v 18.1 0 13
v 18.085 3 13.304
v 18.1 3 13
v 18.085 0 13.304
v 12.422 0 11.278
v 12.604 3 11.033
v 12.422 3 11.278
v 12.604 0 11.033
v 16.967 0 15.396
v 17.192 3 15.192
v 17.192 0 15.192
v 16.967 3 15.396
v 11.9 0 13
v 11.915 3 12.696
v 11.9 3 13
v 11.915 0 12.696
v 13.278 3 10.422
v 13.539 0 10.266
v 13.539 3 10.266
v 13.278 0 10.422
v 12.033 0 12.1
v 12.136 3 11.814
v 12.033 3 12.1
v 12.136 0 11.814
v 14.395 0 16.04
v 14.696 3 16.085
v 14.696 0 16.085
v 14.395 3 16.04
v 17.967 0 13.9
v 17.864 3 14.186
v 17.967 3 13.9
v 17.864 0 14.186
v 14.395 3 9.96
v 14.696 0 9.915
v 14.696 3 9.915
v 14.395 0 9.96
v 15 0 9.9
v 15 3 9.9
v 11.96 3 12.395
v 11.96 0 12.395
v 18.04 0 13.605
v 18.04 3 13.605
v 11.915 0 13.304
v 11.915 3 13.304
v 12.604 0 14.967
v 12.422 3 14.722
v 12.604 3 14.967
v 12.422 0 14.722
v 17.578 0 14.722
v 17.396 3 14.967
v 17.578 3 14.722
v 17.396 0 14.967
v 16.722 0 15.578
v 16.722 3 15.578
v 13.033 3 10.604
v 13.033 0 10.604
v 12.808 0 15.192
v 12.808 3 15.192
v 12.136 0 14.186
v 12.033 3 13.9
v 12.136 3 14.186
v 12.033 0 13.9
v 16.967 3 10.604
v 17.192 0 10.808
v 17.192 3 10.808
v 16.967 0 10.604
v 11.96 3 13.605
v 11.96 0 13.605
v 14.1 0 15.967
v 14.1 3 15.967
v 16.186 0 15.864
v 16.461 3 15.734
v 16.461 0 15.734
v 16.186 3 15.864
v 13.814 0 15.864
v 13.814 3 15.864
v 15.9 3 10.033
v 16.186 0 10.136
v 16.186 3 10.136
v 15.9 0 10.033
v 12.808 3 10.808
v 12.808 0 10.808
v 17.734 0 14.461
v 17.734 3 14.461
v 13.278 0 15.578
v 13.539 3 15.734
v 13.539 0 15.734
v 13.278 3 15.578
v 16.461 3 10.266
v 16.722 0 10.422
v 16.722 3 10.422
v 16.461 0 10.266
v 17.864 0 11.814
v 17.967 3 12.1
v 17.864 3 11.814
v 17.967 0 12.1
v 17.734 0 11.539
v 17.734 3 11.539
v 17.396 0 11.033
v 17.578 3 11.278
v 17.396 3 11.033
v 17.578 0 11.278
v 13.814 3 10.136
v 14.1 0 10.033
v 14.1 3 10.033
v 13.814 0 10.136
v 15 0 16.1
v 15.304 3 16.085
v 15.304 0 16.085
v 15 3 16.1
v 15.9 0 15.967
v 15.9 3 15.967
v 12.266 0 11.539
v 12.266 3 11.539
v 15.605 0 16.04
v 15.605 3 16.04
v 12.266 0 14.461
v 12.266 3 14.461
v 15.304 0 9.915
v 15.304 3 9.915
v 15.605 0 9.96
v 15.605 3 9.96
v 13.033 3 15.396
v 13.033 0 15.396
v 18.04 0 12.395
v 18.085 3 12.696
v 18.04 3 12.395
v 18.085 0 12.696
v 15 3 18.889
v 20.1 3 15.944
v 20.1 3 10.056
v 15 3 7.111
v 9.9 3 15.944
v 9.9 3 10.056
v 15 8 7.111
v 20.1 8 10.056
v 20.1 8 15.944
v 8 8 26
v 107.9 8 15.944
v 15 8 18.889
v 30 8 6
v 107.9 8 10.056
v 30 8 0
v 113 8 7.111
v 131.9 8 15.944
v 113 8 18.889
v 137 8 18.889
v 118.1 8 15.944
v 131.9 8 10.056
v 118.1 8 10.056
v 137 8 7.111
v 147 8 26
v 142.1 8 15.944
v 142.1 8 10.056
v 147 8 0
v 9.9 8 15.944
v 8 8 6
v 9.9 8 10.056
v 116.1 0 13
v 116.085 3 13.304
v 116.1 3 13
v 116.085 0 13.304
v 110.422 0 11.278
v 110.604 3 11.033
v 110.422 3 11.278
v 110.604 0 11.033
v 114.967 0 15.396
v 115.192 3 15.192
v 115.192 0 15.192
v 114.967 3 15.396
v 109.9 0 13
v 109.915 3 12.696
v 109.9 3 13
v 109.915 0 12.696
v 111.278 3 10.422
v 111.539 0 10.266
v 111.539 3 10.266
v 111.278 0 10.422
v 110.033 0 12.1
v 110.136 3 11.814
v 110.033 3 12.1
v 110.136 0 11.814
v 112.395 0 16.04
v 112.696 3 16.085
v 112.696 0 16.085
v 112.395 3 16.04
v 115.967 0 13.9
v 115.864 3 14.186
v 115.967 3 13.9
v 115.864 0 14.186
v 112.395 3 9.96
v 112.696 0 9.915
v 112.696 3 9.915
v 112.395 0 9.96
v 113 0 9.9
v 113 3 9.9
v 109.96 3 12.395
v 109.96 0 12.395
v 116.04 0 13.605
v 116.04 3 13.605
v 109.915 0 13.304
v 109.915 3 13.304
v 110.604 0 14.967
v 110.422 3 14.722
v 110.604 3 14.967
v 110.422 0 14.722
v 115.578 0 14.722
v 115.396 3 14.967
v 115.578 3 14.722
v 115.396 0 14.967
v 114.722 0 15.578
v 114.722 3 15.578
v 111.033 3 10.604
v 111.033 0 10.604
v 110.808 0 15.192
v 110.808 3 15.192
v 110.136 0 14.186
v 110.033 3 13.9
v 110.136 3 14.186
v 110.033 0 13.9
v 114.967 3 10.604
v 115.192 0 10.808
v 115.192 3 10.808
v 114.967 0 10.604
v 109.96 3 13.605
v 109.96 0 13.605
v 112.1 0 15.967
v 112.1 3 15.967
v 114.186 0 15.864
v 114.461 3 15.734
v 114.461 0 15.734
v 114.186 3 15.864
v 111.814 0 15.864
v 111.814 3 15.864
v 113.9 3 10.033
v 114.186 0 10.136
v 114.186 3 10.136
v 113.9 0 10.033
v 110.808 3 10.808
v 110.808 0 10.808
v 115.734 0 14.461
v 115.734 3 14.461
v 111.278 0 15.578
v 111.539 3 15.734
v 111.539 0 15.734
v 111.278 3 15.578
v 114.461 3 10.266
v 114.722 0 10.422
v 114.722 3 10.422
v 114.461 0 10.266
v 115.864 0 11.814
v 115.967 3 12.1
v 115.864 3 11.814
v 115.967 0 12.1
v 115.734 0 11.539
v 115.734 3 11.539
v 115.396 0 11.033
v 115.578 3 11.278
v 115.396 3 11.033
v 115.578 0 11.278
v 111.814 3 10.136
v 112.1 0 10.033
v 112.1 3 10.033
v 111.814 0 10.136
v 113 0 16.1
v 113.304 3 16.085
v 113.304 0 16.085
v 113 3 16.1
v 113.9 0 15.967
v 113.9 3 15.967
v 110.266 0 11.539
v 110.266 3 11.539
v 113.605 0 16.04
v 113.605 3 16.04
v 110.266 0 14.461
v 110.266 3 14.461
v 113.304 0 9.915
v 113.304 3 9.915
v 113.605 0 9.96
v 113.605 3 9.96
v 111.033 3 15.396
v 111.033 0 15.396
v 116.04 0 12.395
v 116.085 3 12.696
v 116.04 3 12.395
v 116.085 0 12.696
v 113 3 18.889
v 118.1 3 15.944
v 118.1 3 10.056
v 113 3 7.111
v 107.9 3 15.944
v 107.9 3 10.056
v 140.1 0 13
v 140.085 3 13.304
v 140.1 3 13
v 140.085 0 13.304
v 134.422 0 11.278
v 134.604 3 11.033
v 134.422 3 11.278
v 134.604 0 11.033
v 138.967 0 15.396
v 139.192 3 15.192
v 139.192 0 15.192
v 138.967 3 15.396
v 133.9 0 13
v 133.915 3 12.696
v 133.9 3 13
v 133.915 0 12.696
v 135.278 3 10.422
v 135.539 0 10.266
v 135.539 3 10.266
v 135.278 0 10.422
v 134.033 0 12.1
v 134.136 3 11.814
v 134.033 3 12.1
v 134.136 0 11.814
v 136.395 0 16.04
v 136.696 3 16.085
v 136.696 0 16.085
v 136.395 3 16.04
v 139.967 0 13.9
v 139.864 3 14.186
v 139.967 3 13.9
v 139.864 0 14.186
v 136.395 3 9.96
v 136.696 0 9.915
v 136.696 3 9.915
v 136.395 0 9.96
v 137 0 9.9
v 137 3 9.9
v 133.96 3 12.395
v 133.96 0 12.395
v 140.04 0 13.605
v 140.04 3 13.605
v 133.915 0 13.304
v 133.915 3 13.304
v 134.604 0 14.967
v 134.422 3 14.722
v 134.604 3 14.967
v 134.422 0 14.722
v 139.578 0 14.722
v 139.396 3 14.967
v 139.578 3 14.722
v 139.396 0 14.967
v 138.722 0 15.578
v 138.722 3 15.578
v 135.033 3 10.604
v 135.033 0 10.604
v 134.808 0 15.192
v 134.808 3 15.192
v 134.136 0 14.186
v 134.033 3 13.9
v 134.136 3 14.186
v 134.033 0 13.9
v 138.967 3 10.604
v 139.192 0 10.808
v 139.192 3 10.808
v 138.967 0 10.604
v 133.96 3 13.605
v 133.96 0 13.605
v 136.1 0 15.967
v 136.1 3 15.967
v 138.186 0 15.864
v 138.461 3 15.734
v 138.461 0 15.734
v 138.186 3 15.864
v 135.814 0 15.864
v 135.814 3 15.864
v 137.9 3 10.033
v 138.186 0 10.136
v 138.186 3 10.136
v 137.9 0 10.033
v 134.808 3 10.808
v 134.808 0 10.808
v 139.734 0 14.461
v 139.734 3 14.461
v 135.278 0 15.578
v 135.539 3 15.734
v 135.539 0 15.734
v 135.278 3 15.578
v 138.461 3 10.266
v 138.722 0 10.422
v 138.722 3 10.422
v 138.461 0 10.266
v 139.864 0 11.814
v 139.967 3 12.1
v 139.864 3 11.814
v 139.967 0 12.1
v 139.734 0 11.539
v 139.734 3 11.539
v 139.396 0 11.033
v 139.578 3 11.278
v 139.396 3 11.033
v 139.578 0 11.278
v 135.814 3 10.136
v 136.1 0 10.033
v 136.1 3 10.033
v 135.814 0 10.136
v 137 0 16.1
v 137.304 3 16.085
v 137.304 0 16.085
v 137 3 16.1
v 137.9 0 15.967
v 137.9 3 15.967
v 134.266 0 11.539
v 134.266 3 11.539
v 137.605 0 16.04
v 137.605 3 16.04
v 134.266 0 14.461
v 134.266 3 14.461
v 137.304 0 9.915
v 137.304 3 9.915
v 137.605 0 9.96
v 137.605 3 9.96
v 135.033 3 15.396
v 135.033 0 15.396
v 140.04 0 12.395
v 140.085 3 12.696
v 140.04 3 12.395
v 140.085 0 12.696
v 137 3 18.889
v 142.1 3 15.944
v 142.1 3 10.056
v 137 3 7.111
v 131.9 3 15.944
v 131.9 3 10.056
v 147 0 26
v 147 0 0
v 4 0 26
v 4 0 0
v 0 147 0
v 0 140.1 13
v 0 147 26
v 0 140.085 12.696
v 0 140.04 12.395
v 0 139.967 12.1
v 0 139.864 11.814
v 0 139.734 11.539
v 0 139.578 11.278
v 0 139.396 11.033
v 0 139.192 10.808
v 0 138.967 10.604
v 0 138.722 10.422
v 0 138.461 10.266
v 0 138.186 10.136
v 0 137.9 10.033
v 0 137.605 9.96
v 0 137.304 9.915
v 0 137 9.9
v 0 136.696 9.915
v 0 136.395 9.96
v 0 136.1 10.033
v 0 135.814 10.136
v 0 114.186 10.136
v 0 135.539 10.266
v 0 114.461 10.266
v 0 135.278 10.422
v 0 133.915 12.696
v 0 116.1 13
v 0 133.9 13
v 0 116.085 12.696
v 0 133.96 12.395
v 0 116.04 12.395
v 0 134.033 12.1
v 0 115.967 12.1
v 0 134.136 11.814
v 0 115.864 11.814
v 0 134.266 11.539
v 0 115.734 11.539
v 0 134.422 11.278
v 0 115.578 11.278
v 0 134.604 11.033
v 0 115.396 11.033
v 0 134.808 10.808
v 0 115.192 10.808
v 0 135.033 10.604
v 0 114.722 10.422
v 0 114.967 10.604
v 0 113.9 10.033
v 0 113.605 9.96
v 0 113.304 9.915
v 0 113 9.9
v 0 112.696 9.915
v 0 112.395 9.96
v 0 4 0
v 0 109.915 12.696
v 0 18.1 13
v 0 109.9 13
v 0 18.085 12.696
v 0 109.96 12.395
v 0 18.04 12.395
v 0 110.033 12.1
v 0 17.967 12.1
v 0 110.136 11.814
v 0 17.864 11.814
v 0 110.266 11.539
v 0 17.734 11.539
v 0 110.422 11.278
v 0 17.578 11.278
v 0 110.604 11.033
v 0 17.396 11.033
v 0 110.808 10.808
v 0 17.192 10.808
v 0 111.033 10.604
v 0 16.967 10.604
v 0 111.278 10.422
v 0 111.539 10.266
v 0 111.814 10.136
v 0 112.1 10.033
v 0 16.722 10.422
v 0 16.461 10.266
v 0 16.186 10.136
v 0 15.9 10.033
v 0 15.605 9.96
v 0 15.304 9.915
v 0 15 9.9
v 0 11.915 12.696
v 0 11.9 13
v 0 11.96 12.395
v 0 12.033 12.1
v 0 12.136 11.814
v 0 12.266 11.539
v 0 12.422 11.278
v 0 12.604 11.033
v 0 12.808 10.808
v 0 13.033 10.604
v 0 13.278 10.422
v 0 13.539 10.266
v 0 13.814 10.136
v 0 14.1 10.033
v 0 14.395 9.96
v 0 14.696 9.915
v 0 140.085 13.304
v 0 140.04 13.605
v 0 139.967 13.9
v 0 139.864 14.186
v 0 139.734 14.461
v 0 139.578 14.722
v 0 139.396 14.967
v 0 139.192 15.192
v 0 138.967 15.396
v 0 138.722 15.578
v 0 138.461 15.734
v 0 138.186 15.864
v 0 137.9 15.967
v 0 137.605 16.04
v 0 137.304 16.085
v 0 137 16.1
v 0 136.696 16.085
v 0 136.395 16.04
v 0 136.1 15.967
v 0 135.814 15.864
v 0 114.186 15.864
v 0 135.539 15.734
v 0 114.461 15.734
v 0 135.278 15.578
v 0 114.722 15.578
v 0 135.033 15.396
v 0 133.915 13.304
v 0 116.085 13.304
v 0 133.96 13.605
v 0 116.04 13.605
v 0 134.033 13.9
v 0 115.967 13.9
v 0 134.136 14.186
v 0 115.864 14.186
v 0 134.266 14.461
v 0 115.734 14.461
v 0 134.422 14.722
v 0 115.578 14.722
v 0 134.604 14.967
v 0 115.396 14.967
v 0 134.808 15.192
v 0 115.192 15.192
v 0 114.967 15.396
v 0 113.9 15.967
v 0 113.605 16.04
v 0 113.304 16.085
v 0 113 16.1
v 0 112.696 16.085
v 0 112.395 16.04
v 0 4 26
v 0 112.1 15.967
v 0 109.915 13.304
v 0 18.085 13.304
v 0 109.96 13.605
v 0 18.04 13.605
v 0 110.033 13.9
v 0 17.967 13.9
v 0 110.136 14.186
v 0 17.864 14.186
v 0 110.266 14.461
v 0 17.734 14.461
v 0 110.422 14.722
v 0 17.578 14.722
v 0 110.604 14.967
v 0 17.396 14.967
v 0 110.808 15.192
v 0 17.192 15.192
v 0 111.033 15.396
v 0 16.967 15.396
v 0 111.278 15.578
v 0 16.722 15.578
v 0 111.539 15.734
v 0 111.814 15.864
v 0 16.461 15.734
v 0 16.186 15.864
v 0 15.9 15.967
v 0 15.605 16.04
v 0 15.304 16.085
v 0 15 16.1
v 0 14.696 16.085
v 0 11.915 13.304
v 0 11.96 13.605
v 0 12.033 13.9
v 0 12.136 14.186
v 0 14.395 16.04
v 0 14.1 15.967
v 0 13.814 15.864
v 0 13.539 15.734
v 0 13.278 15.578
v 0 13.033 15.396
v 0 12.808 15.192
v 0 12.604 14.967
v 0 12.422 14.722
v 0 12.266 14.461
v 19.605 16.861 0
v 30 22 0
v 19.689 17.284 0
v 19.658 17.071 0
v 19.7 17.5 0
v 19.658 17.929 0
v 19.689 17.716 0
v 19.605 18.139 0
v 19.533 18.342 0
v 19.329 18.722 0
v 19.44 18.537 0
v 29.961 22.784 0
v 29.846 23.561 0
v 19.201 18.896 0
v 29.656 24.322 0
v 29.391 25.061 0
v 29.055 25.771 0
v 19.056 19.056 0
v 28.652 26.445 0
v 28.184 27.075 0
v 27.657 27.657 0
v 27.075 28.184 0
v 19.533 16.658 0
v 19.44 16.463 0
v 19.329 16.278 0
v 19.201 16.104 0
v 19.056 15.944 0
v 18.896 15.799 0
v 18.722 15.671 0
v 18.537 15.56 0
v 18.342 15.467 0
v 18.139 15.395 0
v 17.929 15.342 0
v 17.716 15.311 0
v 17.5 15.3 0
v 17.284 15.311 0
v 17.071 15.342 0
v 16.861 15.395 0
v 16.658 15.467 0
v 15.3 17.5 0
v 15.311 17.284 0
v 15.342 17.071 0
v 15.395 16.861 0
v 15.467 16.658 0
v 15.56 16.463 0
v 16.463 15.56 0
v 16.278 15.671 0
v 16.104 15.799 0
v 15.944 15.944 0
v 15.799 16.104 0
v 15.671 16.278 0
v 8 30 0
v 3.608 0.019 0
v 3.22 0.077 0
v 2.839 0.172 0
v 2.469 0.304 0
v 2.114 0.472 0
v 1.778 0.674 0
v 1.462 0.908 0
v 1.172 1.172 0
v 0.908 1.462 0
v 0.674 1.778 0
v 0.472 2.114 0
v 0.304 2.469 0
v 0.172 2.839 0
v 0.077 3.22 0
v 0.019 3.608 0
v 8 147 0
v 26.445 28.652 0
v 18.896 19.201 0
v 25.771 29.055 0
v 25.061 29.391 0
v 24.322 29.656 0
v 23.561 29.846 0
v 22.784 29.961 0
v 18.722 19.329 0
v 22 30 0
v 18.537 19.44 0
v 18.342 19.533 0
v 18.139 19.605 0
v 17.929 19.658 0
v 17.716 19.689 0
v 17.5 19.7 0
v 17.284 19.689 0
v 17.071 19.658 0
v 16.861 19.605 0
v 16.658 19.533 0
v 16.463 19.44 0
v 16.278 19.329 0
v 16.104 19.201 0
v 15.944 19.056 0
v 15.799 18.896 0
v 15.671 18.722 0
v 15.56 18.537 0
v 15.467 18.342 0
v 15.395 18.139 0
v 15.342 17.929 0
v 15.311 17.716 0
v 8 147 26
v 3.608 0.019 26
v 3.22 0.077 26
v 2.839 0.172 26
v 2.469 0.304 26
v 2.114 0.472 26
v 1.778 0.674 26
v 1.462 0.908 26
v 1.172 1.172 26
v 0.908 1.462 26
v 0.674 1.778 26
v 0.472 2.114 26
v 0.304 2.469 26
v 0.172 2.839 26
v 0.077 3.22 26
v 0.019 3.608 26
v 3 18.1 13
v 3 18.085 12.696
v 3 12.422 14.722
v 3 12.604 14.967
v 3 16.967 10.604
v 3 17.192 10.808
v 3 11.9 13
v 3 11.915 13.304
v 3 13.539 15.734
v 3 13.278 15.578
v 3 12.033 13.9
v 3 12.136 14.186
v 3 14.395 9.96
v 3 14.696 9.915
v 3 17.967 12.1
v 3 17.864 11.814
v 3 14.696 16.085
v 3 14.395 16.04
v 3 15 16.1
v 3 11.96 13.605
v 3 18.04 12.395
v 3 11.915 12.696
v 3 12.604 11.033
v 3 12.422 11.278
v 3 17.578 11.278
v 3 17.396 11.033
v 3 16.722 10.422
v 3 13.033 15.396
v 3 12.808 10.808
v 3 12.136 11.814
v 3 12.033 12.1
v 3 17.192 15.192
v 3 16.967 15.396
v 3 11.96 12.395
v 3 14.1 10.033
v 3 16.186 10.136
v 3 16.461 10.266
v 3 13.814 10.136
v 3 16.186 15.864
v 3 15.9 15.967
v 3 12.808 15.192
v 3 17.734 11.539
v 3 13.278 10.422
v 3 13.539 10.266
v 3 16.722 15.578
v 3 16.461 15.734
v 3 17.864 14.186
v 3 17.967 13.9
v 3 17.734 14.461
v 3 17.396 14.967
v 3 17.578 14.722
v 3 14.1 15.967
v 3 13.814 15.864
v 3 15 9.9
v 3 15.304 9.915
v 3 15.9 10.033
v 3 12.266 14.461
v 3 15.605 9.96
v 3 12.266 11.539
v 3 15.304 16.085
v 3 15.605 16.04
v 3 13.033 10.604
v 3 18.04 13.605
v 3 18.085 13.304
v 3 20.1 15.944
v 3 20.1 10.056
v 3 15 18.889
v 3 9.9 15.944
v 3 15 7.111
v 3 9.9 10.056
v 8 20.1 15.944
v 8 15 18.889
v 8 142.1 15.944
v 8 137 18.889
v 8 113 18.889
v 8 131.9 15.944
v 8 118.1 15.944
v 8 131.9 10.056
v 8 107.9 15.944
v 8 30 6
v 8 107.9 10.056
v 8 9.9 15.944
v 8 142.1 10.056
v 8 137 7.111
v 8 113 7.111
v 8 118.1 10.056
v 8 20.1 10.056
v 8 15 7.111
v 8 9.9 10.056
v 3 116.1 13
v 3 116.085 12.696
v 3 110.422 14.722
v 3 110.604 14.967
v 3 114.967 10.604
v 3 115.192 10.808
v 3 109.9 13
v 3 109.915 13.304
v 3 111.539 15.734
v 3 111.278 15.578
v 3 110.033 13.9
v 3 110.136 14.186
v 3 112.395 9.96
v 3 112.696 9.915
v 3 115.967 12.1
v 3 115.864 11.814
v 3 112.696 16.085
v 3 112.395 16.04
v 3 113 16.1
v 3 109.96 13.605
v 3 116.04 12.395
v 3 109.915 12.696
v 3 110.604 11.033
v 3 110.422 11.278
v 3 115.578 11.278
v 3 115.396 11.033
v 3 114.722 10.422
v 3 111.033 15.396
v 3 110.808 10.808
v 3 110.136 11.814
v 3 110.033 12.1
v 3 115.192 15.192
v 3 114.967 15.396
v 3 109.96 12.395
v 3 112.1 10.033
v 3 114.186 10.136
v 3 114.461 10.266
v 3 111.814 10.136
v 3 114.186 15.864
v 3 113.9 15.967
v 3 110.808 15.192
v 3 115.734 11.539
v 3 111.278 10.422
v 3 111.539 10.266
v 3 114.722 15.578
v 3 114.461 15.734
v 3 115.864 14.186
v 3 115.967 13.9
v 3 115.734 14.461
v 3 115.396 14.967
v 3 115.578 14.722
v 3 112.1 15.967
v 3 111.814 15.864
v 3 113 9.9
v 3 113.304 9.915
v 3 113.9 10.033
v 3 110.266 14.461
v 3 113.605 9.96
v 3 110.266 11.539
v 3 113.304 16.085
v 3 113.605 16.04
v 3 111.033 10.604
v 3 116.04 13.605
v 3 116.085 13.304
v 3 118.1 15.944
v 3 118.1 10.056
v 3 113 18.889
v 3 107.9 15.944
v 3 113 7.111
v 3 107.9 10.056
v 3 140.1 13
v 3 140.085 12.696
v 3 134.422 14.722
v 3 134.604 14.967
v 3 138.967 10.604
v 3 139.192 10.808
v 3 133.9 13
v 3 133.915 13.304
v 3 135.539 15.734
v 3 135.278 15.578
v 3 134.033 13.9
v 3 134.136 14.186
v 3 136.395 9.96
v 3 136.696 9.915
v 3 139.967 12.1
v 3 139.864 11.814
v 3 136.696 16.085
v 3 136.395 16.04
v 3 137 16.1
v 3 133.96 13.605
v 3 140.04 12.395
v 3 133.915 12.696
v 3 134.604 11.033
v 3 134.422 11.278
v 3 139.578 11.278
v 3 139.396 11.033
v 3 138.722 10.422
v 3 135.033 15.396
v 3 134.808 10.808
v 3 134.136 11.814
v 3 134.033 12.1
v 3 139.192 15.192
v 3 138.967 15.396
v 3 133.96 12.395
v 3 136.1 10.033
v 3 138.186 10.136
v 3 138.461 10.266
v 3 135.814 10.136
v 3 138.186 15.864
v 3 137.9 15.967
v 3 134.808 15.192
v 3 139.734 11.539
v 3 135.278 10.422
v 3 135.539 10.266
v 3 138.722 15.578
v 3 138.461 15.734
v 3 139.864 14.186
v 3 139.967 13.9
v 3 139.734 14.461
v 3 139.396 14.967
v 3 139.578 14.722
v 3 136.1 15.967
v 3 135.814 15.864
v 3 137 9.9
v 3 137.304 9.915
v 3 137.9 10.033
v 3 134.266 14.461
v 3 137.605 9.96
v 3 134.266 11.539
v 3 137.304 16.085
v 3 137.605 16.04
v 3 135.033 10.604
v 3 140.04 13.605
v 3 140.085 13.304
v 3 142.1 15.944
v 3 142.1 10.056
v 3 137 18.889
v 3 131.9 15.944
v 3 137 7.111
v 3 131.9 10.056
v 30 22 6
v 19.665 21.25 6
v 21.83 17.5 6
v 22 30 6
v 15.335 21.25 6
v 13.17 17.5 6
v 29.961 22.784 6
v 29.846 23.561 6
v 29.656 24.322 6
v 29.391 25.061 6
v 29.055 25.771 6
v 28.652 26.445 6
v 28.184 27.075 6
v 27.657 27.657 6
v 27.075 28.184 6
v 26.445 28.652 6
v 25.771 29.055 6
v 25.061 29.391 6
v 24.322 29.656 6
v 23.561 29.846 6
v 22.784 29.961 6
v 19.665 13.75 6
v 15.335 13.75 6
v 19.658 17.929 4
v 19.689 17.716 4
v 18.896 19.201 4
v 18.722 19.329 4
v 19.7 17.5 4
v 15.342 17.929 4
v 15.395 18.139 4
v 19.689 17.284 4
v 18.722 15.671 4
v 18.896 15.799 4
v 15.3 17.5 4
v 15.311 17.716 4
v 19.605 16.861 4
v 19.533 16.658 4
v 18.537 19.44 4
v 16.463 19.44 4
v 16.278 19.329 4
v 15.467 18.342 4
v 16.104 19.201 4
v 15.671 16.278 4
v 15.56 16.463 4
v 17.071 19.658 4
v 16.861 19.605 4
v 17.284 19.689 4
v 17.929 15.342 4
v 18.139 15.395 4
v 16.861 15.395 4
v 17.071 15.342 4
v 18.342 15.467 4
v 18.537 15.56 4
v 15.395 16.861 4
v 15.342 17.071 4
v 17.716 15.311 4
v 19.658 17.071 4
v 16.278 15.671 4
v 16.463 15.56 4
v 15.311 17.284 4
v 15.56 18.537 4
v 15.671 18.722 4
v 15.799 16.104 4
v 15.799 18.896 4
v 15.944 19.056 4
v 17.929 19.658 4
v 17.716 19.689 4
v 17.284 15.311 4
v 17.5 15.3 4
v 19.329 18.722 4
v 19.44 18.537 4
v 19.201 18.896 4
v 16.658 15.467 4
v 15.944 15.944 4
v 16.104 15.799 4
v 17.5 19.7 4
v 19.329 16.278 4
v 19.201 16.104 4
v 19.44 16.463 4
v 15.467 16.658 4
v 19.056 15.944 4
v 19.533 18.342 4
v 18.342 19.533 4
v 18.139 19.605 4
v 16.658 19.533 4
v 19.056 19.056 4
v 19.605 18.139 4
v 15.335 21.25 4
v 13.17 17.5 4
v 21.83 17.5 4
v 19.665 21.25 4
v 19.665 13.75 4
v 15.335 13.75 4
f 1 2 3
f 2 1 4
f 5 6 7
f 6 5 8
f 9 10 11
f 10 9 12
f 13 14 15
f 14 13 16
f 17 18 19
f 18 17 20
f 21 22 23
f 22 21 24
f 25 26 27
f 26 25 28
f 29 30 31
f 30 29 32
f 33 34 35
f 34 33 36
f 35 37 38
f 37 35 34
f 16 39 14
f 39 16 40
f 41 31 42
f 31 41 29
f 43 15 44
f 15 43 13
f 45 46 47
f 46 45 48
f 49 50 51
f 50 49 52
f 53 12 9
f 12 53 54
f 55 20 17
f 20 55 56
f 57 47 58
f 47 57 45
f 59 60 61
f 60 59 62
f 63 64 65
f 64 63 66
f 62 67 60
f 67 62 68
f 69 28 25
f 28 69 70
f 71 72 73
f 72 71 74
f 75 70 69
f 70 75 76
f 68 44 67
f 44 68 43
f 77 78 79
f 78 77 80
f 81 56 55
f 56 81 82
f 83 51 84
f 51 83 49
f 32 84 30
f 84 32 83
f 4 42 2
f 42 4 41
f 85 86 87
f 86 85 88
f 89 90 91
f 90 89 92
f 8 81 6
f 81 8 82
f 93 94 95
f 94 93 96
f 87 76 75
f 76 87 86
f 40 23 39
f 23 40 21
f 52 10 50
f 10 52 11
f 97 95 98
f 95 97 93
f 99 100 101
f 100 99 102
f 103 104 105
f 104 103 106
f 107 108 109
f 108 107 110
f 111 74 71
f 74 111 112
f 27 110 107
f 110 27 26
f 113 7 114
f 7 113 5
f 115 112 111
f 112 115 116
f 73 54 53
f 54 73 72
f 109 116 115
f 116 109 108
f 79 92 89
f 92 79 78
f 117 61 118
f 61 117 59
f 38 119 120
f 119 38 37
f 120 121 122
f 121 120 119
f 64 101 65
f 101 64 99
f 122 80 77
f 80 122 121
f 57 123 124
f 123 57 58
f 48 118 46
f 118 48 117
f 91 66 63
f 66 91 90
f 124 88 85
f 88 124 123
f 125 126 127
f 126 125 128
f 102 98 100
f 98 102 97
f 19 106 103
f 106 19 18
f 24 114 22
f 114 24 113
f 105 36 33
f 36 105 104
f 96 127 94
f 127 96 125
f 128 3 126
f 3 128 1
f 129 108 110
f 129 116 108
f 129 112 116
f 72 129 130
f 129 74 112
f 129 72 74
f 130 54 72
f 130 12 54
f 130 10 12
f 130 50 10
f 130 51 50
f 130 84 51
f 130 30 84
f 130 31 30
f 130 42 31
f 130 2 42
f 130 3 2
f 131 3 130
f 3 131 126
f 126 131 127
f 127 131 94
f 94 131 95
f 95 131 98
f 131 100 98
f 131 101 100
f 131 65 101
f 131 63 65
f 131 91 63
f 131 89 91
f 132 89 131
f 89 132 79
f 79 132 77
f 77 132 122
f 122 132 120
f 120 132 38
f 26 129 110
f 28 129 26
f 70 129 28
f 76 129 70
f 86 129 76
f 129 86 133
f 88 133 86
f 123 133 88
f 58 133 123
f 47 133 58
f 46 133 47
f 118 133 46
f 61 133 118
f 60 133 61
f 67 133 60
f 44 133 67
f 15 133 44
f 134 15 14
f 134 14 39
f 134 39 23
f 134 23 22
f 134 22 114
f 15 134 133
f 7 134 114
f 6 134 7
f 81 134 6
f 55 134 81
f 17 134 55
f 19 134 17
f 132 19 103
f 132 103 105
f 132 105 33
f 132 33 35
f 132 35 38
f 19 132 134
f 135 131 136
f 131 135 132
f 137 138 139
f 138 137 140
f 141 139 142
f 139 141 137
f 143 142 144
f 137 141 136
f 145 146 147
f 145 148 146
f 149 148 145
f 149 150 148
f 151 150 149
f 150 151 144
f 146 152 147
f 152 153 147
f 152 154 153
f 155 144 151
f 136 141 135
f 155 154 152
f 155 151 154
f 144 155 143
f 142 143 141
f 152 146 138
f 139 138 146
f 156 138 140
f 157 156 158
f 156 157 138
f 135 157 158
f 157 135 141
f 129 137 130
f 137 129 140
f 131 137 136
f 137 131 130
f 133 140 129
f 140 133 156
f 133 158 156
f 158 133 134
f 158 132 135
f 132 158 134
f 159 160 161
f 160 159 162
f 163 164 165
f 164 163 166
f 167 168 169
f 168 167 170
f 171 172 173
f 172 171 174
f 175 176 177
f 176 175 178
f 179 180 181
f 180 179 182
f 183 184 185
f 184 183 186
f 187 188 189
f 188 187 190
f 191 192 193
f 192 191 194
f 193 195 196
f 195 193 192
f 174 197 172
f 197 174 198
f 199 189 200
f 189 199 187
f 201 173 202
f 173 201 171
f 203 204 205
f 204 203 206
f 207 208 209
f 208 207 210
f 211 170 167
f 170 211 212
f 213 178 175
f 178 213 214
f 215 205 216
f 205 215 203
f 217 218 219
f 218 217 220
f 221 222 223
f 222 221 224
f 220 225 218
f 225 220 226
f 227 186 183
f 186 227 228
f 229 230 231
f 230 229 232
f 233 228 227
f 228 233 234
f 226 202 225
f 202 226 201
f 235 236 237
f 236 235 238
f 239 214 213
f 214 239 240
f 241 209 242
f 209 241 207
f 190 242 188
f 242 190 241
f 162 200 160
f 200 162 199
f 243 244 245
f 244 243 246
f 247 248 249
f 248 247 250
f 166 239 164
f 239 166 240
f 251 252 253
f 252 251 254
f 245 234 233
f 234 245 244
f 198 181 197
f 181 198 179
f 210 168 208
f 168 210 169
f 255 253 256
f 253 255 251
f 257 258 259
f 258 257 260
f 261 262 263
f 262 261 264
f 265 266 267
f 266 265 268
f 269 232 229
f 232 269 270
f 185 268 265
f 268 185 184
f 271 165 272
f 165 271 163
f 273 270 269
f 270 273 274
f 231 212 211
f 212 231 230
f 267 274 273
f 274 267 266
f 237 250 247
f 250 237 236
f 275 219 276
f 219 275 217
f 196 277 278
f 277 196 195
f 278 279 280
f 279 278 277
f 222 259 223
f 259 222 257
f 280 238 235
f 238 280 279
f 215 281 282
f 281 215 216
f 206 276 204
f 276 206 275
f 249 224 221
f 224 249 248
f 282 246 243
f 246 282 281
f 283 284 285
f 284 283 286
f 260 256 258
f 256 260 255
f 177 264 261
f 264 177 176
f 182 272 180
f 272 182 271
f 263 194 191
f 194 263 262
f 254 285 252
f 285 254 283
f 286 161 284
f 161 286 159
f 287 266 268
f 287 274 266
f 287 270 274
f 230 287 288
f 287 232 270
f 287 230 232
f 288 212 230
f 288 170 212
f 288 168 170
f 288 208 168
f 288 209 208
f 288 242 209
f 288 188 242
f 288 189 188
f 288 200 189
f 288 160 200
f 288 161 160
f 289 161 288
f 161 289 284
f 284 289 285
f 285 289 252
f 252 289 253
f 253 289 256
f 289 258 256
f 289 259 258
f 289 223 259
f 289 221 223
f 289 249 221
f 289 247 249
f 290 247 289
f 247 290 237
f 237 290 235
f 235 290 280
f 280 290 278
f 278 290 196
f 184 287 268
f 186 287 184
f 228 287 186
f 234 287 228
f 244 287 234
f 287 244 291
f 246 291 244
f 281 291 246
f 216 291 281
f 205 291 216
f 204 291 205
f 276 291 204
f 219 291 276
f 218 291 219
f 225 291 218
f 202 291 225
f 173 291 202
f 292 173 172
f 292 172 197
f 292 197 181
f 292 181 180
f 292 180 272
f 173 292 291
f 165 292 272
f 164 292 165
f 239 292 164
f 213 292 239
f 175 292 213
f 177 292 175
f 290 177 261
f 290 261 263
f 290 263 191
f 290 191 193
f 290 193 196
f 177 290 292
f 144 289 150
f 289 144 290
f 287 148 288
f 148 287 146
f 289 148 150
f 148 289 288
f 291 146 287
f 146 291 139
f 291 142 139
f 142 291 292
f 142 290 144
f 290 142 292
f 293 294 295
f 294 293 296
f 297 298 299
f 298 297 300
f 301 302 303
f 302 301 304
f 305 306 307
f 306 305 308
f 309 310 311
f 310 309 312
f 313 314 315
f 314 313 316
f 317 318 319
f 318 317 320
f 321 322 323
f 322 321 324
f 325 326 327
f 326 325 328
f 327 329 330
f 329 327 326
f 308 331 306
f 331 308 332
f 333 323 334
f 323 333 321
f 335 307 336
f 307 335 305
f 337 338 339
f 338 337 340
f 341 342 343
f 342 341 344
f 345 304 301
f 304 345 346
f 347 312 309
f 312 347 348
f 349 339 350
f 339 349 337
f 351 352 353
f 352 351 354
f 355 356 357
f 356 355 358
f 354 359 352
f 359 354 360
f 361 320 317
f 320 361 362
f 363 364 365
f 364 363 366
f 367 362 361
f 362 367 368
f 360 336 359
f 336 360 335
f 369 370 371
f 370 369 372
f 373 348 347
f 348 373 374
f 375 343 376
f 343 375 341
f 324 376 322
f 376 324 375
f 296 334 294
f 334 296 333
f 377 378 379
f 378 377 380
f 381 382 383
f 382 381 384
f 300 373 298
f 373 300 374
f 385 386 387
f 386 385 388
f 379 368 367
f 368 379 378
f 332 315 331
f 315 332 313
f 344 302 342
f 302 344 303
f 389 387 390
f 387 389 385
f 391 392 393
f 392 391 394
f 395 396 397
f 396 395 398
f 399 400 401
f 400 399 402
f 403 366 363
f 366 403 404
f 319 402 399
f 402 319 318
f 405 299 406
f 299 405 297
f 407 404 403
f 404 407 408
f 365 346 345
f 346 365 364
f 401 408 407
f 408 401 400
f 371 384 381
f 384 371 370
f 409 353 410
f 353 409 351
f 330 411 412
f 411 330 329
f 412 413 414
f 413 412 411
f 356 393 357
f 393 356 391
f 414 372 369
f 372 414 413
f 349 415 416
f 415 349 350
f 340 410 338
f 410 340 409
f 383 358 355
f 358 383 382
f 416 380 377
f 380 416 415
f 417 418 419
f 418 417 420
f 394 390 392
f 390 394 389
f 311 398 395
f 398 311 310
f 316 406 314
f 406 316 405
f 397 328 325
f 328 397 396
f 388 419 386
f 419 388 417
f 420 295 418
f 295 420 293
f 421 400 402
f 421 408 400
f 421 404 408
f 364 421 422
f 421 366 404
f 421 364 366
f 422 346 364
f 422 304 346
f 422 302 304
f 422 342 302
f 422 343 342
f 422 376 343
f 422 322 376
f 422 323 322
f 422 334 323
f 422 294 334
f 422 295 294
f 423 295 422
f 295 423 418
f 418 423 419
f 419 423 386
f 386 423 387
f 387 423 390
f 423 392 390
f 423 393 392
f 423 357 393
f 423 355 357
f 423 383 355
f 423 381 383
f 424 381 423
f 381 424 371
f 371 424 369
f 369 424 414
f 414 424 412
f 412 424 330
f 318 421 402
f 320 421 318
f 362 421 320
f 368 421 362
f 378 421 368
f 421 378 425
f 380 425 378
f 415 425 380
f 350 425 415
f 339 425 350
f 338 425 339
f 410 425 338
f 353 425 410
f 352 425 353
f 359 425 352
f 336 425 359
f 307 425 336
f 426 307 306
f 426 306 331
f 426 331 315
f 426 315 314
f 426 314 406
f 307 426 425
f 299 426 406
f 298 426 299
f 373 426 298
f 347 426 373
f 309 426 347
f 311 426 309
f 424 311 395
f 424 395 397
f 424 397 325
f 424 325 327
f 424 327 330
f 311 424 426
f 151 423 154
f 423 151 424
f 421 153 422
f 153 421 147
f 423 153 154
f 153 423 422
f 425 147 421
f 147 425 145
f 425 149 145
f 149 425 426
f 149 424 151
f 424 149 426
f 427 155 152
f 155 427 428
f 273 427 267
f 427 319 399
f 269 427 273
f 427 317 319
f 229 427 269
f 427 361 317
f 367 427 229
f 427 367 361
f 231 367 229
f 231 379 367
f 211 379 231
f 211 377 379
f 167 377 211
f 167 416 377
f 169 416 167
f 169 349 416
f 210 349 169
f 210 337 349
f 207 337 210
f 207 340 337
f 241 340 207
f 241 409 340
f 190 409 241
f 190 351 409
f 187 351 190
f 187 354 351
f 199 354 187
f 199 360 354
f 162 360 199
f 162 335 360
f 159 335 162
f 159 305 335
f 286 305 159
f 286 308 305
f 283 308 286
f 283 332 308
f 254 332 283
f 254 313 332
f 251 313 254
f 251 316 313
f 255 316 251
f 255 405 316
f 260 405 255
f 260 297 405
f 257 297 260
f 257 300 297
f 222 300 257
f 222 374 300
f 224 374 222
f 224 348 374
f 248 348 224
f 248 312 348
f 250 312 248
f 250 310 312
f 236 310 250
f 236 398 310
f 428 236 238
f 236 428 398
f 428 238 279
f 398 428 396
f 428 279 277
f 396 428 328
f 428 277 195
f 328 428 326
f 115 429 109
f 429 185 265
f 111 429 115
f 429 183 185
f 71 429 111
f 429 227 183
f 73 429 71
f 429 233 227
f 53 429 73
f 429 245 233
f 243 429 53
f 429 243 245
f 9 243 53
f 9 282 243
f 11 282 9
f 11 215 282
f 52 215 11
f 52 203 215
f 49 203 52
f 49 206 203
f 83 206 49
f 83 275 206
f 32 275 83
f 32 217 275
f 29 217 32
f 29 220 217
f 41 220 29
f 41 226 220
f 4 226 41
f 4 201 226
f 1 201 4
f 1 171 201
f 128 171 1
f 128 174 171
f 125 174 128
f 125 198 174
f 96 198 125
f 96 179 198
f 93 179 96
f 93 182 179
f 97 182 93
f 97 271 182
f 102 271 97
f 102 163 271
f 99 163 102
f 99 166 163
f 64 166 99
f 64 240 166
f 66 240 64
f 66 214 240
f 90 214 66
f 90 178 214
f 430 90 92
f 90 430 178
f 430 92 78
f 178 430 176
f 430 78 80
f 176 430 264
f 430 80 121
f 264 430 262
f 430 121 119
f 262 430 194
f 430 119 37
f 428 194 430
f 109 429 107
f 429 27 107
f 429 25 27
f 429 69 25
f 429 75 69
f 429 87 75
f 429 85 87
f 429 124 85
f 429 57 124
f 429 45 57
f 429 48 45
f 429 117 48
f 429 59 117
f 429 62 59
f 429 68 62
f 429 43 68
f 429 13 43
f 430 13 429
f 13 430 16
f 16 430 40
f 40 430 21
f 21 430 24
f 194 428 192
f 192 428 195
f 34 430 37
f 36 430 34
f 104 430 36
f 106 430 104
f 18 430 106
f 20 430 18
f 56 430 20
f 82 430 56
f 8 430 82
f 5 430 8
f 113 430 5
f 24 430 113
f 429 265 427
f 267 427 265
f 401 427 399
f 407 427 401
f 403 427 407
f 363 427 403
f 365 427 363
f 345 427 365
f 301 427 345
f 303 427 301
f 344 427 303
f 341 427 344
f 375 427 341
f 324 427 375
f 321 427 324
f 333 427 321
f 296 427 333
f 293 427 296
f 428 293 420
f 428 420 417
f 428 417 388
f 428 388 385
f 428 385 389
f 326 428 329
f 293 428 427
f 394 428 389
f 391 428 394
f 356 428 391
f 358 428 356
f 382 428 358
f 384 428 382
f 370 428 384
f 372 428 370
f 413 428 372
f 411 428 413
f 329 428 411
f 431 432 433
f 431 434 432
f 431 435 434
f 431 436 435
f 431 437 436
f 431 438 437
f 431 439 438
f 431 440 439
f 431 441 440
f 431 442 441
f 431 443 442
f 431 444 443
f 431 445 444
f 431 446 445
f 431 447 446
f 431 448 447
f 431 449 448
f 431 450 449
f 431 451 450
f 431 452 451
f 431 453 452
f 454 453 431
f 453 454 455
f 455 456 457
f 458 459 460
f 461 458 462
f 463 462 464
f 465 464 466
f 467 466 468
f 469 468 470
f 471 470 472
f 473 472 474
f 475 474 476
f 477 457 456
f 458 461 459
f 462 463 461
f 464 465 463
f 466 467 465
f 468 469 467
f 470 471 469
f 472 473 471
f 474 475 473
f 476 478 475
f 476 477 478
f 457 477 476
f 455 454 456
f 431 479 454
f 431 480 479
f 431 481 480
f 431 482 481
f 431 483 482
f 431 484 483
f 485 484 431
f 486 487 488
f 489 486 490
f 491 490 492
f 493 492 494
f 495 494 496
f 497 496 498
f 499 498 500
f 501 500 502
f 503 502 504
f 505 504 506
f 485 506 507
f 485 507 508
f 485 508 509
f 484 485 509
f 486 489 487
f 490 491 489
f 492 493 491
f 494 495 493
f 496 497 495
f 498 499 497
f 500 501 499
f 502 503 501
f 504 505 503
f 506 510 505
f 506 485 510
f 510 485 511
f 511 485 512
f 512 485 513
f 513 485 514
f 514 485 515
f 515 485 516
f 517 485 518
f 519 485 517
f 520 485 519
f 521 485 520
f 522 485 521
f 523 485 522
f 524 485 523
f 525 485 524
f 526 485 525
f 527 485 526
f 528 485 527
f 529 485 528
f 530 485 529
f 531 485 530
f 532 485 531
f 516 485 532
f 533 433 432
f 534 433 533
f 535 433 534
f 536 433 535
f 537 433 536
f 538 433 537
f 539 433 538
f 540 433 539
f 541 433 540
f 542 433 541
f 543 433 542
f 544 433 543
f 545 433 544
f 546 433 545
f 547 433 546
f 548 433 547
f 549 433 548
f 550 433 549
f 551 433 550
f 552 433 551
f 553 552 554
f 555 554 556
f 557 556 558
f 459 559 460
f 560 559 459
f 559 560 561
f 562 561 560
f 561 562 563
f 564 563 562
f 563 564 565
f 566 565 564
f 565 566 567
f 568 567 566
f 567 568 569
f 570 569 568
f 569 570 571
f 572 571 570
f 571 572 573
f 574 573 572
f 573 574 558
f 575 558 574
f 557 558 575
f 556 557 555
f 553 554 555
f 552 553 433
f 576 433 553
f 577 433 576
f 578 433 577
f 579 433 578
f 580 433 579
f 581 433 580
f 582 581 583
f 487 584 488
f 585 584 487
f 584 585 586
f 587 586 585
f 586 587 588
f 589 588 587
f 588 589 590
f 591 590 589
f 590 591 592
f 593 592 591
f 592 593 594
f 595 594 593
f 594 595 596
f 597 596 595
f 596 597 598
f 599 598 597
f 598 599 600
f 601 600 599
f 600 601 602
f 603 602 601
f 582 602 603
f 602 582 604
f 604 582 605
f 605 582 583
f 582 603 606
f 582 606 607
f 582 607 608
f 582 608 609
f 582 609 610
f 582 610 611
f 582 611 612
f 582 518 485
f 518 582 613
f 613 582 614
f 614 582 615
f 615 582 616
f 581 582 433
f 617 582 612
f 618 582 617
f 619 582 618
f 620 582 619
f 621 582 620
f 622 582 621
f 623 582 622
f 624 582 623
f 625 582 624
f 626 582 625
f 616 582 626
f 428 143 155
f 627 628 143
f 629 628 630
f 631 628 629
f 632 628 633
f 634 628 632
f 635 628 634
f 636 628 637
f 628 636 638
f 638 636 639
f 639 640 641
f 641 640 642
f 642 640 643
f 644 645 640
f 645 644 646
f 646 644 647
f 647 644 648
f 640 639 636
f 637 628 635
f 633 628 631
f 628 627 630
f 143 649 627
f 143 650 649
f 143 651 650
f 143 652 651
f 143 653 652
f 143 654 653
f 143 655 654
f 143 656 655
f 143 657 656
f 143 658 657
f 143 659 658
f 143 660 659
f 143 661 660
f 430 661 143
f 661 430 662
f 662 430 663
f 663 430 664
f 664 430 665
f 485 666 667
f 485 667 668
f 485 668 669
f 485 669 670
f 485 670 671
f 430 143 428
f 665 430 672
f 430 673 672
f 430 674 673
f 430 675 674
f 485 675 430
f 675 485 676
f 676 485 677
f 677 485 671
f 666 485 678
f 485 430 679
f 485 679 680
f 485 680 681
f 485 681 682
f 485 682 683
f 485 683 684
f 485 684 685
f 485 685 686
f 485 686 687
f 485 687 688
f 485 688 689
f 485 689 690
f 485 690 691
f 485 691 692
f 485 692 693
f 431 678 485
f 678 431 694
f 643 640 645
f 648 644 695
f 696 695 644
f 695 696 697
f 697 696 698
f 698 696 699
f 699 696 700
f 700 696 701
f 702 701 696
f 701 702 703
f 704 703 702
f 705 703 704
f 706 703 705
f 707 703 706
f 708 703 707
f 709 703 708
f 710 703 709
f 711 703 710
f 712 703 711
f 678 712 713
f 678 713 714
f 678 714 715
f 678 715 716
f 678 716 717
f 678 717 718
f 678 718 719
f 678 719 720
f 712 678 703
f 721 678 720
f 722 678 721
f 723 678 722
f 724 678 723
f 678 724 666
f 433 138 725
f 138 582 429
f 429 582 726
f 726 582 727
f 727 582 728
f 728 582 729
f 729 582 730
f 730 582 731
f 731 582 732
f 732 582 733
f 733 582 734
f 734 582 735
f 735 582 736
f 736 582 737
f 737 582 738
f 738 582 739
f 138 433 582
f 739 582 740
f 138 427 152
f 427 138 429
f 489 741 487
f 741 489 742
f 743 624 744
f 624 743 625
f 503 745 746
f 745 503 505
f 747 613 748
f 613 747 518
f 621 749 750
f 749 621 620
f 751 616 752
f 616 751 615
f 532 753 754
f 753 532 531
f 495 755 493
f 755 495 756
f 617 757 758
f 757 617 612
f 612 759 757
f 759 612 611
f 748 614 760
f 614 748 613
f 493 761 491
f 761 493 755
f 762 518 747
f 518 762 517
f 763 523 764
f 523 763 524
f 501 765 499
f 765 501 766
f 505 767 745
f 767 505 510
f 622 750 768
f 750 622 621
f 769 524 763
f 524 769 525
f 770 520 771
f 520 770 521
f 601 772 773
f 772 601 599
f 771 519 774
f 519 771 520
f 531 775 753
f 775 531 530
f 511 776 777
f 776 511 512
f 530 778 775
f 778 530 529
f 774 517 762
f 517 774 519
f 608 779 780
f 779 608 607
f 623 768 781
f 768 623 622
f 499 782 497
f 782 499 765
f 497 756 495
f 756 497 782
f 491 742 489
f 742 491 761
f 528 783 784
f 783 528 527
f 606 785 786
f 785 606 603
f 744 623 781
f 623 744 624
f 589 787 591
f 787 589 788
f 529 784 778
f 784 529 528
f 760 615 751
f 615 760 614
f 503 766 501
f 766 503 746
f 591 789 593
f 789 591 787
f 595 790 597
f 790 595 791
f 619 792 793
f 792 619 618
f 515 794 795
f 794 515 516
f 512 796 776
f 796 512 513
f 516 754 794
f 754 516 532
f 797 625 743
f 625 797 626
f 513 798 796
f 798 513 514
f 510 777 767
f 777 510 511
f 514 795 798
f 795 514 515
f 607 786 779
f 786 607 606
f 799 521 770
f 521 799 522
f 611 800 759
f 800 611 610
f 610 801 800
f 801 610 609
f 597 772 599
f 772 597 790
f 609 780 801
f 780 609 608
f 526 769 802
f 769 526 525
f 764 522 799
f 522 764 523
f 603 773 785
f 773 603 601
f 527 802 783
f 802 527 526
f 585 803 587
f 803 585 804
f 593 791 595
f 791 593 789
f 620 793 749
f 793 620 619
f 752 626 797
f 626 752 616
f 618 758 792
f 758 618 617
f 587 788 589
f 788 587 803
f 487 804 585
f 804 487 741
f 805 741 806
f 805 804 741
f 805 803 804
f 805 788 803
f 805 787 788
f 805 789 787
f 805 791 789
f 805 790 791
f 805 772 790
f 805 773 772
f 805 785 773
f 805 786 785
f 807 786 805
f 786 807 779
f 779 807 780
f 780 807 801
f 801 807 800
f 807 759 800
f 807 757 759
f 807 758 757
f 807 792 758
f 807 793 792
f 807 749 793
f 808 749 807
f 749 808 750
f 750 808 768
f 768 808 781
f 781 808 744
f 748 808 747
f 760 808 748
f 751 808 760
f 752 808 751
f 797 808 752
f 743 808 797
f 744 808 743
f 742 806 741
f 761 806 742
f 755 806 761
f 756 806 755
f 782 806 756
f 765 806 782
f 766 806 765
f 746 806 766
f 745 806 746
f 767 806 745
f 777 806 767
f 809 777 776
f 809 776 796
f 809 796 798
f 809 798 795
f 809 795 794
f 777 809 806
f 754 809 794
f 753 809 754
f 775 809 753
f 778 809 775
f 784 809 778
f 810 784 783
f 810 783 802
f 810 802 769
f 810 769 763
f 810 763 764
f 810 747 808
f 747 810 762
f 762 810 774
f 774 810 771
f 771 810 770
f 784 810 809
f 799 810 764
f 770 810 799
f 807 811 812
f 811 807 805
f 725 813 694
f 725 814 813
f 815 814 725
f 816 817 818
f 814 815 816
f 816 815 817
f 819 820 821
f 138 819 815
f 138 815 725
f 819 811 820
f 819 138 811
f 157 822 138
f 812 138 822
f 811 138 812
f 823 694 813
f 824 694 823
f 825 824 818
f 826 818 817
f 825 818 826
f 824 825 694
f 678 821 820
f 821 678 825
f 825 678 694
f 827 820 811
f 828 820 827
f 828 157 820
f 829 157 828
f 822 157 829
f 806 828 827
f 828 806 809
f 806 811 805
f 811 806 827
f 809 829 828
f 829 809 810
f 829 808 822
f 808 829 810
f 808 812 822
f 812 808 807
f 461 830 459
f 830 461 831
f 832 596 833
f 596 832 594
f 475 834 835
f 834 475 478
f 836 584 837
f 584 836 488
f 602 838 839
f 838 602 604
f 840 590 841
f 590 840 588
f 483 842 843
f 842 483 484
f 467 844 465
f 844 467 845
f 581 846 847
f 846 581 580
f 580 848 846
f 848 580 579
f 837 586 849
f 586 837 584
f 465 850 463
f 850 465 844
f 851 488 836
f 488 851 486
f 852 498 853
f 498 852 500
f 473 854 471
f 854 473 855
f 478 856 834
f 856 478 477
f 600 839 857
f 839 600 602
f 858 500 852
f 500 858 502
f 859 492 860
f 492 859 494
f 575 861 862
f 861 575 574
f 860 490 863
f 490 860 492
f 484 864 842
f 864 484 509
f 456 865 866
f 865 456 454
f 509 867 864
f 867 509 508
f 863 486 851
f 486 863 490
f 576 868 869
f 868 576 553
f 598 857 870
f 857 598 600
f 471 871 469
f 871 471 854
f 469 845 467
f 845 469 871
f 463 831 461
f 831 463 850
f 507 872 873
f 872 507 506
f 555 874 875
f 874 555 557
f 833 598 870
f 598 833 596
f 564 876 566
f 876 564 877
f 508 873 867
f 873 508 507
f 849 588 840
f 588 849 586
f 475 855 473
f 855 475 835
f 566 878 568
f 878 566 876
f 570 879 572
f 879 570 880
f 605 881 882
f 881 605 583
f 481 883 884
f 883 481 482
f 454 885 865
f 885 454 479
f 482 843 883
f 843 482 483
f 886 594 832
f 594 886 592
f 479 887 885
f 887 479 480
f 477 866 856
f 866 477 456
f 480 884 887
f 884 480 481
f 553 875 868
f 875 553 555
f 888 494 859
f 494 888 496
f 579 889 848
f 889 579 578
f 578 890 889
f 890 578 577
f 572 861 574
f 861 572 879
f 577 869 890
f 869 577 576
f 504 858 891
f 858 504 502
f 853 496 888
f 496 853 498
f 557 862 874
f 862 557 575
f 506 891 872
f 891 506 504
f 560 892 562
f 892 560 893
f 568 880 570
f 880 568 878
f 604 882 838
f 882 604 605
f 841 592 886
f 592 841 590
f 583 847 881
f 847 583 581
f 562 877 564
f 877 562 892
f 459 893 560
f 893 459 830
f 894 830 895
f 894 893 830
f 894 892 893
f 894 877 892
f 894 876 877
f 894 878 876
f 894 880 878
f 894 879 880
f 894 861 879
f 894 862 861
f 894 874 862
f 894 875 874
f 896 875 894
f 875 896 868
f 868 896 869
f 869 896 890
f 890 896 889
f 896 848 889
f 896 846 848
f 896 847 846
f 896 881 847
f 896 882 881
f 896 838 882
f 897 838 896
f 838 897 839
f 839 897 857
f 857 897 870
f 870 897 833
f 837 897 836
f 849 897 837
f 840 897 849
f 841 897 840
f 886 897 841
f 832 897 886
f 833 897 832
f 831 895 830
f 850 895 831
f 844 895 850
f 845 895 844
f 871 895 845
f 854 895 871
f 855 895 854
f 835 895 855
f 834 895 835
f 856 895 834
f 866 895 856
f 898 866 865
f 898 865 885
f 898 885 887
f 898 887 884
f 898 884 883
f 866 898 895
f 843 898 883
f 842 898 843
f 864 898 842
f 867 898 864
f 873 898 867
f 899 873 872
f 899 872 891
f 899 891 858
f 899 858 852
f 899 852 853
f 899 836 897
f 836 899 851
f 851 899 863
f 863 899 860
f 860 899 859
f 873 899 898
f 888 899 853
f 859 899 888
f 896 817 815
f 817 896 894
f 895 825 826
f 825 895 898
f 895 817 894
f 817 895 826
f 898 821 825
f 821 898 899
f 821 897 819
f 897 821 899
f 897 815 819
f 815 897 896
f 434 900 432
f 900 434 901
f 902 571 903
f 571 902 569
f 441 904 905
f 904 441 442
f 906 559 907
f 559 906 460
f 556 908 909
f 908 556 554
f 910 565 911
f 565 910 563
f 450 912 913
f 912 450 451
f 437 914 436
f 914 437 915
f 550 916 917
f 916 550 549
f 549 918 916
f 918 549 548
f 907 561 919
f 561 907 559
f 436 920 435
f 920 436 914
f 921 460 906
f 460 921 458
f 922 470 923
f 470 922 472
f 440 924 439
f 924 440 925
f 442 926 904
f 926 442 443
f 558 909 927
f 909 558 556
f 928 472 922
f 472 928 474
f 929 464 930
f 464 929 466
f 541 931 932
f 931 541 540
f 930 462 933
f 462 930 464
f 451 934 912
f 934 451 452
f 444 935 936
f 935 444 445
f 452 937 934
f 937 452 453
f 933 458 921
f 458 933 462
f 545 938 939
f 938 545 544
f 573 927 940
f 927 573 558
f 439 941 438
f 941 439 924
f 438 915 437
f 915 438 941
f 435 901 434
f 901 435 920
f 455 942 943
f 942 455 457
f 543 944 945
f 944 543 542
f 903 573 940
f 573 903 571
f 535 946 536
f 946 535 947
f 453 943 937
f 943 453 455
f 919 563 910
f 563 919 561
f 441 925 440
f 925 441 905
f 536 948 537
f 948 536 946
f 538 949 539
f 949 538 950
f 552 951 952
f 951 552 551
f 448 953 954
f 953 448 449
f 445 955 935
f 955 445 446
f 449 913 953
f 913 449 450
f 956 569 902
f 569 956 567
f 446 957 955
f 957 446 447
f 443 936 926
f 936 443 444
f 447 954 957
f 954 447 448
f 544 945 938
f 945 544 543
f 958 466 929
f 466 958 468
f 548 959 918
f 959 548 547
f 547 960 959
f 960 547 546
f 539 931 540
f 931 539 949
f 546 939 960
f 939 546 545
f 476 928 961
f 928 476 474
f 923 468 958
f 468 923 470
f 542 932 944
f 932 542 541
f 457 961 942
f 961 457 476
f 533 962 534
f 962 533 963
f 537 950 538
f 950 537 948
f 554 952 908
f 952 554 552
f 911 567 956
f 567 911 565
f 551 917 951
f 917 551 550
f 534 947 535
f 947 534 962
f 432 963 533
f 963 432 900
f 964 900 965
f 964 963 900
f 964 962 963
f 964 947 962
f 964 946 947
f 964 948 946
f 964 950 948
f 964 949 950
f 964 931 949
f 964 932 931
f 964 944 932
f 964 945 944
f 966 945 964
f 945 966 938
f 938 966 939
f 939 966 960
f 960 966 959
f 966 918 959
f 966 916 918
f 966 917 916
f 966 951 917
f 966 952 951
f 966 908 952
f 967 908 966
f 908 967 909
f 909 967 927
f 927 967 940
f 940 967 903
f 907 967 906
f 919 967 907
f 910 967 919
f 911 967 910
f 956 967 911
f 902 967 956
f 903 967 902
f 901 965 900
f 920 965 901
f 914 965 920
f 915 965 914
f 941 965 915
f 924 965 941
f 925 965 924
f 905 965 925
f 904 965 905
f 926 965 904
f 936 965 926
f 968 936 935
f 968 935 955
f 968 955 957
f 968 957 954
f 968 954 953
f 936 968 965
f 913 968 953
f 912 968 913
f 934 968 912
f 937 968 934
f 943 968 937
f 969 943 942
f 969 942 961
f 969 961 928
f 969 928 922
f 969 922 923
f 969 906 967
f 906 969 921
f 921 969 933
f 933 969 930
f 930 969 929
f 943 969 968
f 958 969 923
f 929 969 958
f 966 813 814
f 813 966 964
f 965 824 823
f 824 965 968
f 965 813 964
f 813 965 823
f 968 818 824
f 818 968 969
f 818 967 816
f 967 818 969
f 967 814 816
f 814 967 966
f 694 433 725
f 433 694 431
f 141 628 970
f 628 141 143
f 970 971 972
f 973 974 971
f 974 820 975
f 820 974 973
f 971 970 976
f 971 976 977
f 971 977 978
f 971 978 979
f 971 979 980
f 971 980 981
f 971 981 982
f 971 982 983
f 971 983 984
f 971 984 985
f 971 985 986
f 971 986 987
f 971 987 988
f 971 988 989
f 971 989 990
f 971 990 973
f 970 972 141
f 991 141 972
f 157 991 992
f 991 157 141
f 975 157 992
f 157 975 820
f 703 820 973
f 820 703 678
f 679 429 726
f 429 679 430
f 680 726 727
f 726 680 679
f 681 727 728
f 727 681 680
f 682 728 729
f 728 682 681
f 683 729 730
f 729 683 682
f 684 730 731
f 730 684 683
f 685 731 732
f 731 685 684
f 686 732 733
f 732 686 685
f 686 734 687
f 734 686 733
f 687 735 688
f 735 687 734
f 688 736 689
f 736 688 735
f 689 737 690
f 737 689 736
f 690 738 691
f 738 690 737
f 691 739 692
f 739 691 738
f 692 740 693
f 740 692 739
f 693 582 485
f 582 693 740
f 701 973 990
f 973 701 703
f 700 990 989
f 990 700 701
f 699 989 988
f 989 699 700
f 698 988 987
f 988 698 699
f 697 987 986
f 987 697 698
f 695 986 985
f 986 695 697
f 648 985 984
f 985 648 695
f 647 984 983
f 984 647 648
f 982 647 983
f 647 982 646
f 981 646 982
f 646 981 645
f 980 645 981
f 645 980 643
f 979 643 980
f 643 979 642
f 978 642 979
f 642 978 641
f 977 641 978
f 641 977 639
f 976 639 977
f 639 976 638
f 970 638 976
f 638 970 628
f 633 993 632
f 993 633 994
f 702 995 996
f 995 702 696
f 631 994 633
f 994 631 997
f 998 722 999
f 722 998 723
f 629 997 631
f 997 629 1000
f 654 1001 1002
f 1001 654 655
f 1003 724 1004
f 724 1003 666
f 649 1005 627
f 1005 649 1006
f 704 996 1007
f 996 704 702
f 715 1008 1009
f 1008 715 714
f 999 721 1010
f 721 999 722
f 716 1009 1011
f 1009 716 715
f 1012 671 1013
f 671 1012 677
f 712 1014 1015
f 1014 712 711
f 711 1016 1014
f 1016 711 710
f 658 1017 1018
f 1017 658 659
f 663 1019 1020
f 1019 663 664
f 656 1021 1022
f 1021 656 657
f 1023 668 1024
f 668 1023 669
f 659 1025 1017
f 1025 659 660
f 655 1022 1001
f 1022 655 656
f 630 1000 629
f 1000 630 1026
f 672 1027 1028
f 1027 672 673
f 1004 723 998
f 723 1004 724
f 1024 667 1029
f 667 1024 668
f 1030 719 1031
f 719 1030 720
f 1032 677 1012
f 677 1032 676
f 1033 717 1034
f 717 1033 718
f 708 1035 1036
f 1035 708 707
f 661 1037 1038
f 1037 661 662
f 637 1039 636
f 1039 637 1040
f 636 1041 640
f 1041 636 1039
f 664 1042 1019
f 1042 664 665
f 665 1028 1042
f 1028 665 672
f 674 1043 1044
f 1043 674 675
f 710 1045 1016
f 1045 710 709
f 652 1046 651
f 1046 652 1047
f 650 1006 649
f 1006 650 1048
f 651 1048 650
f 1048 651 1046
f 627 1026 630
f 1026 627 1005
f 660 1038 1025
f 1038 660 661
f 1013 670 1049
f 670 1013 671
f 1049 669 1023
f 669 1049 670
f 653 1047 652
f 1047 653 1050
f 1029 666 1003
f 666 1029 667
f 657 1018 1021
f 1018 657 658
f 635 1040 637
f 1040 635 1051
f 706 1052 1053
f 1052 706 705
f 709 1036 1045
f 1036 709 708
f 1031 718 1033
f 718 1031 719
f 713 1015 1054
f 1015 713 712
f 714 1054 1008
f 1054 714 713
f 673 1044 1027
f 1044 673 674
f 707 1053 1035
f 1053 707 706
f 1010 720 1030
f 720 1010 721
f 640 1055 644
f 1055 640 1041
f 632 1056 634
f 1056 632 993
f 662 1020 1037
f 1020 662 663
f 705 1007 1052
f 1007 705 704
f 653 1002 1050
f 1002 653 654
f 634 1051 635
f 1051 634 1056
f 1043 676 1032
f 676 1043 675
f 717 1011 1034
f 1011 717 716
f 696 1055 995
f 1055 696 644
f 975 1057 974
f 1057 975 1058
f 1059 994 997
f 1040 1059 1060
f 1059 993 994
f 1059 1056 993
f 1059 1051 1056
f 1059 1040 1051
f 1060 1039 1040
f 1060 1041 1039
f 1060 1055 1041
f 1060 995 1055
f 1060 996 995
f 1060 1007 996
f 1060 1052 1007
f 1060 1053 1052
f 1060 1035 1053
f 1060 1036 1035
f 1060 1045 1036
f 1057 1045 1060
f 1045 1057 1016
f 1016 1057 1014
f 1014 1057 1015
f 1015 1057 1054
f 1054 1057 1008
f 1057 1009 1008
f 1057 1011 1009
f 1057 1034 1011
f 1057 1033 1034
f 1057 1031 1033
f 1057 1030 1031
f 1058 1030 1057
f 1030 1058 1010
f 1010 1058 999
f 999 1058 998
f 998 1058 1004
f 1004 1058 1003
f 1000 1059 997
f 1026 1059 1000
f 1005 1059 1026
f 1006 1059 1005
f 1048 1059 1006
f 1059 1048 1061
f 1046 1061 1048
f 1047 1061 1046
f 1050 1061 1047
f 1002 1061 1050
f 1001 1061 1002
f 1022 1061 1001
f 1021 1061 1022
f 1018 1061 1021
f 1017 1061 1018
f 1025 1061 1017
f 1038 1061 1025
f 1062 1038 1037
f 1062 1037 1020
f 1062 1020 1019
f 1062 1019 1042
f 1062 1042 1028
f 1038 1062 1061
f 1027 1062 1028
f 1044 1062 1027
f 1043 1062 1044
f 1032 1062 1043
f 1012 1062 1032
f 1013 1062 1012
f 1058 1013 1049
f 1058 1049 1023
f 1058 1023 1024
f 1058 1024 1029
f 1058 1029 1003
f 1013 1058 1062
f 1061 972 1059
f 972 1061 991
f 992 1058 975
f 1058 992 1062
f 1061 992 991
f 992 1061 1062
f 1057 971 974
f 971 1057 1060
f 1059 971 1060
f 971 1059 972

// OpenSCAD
// file: ../../../modules/bolts.scad
module nut_trap(d, h, center = true) {
  linear_extrude(height = h, center = center)
  circle(d = d / cos(30), $fn = 6);
}

module bolt_hole(d, h, center = true) {
  linear_extrude(height = h, center = center)
  circle(d = d, $fn = 64);
}

// Hex holes for self-tapping (nominal - 0.2mm)
module hex_hole(flat_d, h) {
  linear_extrude(height = h, center = true)
  circle(d = flat_d / cos(30), $fn = 6);
}

module m3_bolt_hexhole(h) {
  rotate([0, 0, 90])
  hex_hole(flat_d = 2.8, h = h);
}

module m4_bolt_hexhole(h) {
  rotate([0, 0, 90])
  hex_hole(flat_d = 3.8, h = h);
}

module m6_bolt_hexhole(h) {
  rotate([0, 0, 90])
  hex_hole(flat_d = 5.8, h = h);
}

module m8_bolt_hexhole(h) {

  rotate([0, 0, 90])

  hex_hole(flat_d = 7.8, h = h);

}





// --- Size-specific, separated modules for flexible placement ---



// M3

module m3_bolt_hole(h, center = false) {

  bolt_hole(d = 3.4, h = h, center = center);

}

module m3_nut_trap(h, center = false) {

  nut_trap(d = 5.7, h = h, center = center);

}



// M4

module m4_bolt_hole(h, center = false) {

  bolt_hole(d = 4.4, h = h, center = center);

}

module m4_nut_trap(h, center = false) {

  nut_trap(d = 7.5, h = h, center = center);

}



// M6

module m6_bolt_hole(h, center = false) {

  bolt_hole(d = 6.2, h = h, center = center);

}

module m6_nut_trap(h, center = false) {

  nut_trap(d = 10.2, h = h, center = center);

}



// M8

module m8_bolt_hole(h, center = false) {

  bolt_hole(d = 8.4, h = h, center = center);

}

module m8_nut_trap(h, center = false) {

  nut_trap(d = 13.3, h = h, center = center);

}
// main file
use <../../../modules/bolts.scad>;
width = 147;
height = 26;
deps = 8;
inner_radius = 4; // Radius for the main bracket's inner fillet.
plate_corner_radius = 8; // Radius for the plate's outer corner.

// A single difference operation defines the final shape, ensuring all fillets and holes are processed correctly.
difference() {
  // 1. First, unify all solid components to form a single solid body.
  union() {
    // Main bracket bars
    translate([0, 0, height])
      rotate([90, 180, 180])
      long_bar(width, height, deps);

    translate([0, 0, 0])
      rotate([90, 0, 90])
      long_bar(width, height, deps);

    // The connection plate
    cube([30, 30, 6]);
  }

  // 2. Now, subtract all the negative spaces (fillets and holes) from the unified body.

  // Inner corner fillet: Applies to the entire height of the unified body, ensuring a consistent inner radius.
  translate([inner_radius, inner_radius, -0.1])
    rotate([0, 0, 180])
    fillet_profile(inner_radius, (height * 2) + 1.2);

  // Outer corner fillet: Applies only to the plate's outer corner.
  translate([30 - plate_corner_radius, 30 - plate_corner_radius, -0.1])
    linear_extrude(height = 6.2)
    difference() {
      square([plate_corner_radius, plate_corner_radius]);
      circle(r = plate_corner_radius, $fn = 64);
    }

  // Bolt and nut holes using M4-specific modules
  translate([17.5, 17.5, -0.1])
    m4_bolt_hole(h = 6.5);

  translate([17.5, 17.5, 4])
    m4_nut_trap(h = 2.5);
}

// Module for creating an inner fillet profile.
module fillet_profile(r, h) {
  linear_extrude(height = h, center = true)
    difference() {
      square([r, r]);
      circle(r = r, $fn = 64);
    }
}

// Module for the long bar of the bracket
module long_bar (w, y, h) {
  difference() {
    translate([w / 2, y / 2, h / 2])
      cube([w, y, h], center=true);

    translate([15, y / 2, 0])
      union() {
        nut_thickness = 5; // M6 nut height

        // Replicates hole from z~0 to z~h
        translate([0, 0, h / 2])
          m6_bolt_hole(h + 1, center = true);

        // Replicates nut trap at the top surface (from z=h-thickness to z=h)
        translate([0, 0, h - nut_thickness / 2])
          rotate([0, 0, 90])
          m6_nut_trap(nut_thickness, center = true);
      }
    translate([15 + 98, y / 2, 0])
      union() {
        nut_thickness = 5; // M6 nut height

        // Replicates hole from z~0 to z~h
        translate([0, 0, h / 2])
          m6_bolt_hole(h + 1, center = true);

        // Replicates nut trap at the top surface (from z=h-thickness to z=h)
        translate([0, 0, h - nut_thickness / 2])
          rotate([0, 0, 90])
          m6_nut_trap(nut_thickness, center = true);
      }
    translate([15 + 98 + 24, y / 2, 0])
      union() {
        nut_thickness = 5; // M6 nut height

        // Replicates hole from z~0 to z~h
        translate([0, 0, h / 2])
          m6_bolt_hole(h + 1, center = true);

        // Replicates nut trap at the top surface (from z=h-thickness to z=h)
        translate([0, 0, h - nut_thickness / 2])
          rotate([0, 0, 90])
          m6_nut_trap(nut_thickness, center = true);
      }
  }
}
